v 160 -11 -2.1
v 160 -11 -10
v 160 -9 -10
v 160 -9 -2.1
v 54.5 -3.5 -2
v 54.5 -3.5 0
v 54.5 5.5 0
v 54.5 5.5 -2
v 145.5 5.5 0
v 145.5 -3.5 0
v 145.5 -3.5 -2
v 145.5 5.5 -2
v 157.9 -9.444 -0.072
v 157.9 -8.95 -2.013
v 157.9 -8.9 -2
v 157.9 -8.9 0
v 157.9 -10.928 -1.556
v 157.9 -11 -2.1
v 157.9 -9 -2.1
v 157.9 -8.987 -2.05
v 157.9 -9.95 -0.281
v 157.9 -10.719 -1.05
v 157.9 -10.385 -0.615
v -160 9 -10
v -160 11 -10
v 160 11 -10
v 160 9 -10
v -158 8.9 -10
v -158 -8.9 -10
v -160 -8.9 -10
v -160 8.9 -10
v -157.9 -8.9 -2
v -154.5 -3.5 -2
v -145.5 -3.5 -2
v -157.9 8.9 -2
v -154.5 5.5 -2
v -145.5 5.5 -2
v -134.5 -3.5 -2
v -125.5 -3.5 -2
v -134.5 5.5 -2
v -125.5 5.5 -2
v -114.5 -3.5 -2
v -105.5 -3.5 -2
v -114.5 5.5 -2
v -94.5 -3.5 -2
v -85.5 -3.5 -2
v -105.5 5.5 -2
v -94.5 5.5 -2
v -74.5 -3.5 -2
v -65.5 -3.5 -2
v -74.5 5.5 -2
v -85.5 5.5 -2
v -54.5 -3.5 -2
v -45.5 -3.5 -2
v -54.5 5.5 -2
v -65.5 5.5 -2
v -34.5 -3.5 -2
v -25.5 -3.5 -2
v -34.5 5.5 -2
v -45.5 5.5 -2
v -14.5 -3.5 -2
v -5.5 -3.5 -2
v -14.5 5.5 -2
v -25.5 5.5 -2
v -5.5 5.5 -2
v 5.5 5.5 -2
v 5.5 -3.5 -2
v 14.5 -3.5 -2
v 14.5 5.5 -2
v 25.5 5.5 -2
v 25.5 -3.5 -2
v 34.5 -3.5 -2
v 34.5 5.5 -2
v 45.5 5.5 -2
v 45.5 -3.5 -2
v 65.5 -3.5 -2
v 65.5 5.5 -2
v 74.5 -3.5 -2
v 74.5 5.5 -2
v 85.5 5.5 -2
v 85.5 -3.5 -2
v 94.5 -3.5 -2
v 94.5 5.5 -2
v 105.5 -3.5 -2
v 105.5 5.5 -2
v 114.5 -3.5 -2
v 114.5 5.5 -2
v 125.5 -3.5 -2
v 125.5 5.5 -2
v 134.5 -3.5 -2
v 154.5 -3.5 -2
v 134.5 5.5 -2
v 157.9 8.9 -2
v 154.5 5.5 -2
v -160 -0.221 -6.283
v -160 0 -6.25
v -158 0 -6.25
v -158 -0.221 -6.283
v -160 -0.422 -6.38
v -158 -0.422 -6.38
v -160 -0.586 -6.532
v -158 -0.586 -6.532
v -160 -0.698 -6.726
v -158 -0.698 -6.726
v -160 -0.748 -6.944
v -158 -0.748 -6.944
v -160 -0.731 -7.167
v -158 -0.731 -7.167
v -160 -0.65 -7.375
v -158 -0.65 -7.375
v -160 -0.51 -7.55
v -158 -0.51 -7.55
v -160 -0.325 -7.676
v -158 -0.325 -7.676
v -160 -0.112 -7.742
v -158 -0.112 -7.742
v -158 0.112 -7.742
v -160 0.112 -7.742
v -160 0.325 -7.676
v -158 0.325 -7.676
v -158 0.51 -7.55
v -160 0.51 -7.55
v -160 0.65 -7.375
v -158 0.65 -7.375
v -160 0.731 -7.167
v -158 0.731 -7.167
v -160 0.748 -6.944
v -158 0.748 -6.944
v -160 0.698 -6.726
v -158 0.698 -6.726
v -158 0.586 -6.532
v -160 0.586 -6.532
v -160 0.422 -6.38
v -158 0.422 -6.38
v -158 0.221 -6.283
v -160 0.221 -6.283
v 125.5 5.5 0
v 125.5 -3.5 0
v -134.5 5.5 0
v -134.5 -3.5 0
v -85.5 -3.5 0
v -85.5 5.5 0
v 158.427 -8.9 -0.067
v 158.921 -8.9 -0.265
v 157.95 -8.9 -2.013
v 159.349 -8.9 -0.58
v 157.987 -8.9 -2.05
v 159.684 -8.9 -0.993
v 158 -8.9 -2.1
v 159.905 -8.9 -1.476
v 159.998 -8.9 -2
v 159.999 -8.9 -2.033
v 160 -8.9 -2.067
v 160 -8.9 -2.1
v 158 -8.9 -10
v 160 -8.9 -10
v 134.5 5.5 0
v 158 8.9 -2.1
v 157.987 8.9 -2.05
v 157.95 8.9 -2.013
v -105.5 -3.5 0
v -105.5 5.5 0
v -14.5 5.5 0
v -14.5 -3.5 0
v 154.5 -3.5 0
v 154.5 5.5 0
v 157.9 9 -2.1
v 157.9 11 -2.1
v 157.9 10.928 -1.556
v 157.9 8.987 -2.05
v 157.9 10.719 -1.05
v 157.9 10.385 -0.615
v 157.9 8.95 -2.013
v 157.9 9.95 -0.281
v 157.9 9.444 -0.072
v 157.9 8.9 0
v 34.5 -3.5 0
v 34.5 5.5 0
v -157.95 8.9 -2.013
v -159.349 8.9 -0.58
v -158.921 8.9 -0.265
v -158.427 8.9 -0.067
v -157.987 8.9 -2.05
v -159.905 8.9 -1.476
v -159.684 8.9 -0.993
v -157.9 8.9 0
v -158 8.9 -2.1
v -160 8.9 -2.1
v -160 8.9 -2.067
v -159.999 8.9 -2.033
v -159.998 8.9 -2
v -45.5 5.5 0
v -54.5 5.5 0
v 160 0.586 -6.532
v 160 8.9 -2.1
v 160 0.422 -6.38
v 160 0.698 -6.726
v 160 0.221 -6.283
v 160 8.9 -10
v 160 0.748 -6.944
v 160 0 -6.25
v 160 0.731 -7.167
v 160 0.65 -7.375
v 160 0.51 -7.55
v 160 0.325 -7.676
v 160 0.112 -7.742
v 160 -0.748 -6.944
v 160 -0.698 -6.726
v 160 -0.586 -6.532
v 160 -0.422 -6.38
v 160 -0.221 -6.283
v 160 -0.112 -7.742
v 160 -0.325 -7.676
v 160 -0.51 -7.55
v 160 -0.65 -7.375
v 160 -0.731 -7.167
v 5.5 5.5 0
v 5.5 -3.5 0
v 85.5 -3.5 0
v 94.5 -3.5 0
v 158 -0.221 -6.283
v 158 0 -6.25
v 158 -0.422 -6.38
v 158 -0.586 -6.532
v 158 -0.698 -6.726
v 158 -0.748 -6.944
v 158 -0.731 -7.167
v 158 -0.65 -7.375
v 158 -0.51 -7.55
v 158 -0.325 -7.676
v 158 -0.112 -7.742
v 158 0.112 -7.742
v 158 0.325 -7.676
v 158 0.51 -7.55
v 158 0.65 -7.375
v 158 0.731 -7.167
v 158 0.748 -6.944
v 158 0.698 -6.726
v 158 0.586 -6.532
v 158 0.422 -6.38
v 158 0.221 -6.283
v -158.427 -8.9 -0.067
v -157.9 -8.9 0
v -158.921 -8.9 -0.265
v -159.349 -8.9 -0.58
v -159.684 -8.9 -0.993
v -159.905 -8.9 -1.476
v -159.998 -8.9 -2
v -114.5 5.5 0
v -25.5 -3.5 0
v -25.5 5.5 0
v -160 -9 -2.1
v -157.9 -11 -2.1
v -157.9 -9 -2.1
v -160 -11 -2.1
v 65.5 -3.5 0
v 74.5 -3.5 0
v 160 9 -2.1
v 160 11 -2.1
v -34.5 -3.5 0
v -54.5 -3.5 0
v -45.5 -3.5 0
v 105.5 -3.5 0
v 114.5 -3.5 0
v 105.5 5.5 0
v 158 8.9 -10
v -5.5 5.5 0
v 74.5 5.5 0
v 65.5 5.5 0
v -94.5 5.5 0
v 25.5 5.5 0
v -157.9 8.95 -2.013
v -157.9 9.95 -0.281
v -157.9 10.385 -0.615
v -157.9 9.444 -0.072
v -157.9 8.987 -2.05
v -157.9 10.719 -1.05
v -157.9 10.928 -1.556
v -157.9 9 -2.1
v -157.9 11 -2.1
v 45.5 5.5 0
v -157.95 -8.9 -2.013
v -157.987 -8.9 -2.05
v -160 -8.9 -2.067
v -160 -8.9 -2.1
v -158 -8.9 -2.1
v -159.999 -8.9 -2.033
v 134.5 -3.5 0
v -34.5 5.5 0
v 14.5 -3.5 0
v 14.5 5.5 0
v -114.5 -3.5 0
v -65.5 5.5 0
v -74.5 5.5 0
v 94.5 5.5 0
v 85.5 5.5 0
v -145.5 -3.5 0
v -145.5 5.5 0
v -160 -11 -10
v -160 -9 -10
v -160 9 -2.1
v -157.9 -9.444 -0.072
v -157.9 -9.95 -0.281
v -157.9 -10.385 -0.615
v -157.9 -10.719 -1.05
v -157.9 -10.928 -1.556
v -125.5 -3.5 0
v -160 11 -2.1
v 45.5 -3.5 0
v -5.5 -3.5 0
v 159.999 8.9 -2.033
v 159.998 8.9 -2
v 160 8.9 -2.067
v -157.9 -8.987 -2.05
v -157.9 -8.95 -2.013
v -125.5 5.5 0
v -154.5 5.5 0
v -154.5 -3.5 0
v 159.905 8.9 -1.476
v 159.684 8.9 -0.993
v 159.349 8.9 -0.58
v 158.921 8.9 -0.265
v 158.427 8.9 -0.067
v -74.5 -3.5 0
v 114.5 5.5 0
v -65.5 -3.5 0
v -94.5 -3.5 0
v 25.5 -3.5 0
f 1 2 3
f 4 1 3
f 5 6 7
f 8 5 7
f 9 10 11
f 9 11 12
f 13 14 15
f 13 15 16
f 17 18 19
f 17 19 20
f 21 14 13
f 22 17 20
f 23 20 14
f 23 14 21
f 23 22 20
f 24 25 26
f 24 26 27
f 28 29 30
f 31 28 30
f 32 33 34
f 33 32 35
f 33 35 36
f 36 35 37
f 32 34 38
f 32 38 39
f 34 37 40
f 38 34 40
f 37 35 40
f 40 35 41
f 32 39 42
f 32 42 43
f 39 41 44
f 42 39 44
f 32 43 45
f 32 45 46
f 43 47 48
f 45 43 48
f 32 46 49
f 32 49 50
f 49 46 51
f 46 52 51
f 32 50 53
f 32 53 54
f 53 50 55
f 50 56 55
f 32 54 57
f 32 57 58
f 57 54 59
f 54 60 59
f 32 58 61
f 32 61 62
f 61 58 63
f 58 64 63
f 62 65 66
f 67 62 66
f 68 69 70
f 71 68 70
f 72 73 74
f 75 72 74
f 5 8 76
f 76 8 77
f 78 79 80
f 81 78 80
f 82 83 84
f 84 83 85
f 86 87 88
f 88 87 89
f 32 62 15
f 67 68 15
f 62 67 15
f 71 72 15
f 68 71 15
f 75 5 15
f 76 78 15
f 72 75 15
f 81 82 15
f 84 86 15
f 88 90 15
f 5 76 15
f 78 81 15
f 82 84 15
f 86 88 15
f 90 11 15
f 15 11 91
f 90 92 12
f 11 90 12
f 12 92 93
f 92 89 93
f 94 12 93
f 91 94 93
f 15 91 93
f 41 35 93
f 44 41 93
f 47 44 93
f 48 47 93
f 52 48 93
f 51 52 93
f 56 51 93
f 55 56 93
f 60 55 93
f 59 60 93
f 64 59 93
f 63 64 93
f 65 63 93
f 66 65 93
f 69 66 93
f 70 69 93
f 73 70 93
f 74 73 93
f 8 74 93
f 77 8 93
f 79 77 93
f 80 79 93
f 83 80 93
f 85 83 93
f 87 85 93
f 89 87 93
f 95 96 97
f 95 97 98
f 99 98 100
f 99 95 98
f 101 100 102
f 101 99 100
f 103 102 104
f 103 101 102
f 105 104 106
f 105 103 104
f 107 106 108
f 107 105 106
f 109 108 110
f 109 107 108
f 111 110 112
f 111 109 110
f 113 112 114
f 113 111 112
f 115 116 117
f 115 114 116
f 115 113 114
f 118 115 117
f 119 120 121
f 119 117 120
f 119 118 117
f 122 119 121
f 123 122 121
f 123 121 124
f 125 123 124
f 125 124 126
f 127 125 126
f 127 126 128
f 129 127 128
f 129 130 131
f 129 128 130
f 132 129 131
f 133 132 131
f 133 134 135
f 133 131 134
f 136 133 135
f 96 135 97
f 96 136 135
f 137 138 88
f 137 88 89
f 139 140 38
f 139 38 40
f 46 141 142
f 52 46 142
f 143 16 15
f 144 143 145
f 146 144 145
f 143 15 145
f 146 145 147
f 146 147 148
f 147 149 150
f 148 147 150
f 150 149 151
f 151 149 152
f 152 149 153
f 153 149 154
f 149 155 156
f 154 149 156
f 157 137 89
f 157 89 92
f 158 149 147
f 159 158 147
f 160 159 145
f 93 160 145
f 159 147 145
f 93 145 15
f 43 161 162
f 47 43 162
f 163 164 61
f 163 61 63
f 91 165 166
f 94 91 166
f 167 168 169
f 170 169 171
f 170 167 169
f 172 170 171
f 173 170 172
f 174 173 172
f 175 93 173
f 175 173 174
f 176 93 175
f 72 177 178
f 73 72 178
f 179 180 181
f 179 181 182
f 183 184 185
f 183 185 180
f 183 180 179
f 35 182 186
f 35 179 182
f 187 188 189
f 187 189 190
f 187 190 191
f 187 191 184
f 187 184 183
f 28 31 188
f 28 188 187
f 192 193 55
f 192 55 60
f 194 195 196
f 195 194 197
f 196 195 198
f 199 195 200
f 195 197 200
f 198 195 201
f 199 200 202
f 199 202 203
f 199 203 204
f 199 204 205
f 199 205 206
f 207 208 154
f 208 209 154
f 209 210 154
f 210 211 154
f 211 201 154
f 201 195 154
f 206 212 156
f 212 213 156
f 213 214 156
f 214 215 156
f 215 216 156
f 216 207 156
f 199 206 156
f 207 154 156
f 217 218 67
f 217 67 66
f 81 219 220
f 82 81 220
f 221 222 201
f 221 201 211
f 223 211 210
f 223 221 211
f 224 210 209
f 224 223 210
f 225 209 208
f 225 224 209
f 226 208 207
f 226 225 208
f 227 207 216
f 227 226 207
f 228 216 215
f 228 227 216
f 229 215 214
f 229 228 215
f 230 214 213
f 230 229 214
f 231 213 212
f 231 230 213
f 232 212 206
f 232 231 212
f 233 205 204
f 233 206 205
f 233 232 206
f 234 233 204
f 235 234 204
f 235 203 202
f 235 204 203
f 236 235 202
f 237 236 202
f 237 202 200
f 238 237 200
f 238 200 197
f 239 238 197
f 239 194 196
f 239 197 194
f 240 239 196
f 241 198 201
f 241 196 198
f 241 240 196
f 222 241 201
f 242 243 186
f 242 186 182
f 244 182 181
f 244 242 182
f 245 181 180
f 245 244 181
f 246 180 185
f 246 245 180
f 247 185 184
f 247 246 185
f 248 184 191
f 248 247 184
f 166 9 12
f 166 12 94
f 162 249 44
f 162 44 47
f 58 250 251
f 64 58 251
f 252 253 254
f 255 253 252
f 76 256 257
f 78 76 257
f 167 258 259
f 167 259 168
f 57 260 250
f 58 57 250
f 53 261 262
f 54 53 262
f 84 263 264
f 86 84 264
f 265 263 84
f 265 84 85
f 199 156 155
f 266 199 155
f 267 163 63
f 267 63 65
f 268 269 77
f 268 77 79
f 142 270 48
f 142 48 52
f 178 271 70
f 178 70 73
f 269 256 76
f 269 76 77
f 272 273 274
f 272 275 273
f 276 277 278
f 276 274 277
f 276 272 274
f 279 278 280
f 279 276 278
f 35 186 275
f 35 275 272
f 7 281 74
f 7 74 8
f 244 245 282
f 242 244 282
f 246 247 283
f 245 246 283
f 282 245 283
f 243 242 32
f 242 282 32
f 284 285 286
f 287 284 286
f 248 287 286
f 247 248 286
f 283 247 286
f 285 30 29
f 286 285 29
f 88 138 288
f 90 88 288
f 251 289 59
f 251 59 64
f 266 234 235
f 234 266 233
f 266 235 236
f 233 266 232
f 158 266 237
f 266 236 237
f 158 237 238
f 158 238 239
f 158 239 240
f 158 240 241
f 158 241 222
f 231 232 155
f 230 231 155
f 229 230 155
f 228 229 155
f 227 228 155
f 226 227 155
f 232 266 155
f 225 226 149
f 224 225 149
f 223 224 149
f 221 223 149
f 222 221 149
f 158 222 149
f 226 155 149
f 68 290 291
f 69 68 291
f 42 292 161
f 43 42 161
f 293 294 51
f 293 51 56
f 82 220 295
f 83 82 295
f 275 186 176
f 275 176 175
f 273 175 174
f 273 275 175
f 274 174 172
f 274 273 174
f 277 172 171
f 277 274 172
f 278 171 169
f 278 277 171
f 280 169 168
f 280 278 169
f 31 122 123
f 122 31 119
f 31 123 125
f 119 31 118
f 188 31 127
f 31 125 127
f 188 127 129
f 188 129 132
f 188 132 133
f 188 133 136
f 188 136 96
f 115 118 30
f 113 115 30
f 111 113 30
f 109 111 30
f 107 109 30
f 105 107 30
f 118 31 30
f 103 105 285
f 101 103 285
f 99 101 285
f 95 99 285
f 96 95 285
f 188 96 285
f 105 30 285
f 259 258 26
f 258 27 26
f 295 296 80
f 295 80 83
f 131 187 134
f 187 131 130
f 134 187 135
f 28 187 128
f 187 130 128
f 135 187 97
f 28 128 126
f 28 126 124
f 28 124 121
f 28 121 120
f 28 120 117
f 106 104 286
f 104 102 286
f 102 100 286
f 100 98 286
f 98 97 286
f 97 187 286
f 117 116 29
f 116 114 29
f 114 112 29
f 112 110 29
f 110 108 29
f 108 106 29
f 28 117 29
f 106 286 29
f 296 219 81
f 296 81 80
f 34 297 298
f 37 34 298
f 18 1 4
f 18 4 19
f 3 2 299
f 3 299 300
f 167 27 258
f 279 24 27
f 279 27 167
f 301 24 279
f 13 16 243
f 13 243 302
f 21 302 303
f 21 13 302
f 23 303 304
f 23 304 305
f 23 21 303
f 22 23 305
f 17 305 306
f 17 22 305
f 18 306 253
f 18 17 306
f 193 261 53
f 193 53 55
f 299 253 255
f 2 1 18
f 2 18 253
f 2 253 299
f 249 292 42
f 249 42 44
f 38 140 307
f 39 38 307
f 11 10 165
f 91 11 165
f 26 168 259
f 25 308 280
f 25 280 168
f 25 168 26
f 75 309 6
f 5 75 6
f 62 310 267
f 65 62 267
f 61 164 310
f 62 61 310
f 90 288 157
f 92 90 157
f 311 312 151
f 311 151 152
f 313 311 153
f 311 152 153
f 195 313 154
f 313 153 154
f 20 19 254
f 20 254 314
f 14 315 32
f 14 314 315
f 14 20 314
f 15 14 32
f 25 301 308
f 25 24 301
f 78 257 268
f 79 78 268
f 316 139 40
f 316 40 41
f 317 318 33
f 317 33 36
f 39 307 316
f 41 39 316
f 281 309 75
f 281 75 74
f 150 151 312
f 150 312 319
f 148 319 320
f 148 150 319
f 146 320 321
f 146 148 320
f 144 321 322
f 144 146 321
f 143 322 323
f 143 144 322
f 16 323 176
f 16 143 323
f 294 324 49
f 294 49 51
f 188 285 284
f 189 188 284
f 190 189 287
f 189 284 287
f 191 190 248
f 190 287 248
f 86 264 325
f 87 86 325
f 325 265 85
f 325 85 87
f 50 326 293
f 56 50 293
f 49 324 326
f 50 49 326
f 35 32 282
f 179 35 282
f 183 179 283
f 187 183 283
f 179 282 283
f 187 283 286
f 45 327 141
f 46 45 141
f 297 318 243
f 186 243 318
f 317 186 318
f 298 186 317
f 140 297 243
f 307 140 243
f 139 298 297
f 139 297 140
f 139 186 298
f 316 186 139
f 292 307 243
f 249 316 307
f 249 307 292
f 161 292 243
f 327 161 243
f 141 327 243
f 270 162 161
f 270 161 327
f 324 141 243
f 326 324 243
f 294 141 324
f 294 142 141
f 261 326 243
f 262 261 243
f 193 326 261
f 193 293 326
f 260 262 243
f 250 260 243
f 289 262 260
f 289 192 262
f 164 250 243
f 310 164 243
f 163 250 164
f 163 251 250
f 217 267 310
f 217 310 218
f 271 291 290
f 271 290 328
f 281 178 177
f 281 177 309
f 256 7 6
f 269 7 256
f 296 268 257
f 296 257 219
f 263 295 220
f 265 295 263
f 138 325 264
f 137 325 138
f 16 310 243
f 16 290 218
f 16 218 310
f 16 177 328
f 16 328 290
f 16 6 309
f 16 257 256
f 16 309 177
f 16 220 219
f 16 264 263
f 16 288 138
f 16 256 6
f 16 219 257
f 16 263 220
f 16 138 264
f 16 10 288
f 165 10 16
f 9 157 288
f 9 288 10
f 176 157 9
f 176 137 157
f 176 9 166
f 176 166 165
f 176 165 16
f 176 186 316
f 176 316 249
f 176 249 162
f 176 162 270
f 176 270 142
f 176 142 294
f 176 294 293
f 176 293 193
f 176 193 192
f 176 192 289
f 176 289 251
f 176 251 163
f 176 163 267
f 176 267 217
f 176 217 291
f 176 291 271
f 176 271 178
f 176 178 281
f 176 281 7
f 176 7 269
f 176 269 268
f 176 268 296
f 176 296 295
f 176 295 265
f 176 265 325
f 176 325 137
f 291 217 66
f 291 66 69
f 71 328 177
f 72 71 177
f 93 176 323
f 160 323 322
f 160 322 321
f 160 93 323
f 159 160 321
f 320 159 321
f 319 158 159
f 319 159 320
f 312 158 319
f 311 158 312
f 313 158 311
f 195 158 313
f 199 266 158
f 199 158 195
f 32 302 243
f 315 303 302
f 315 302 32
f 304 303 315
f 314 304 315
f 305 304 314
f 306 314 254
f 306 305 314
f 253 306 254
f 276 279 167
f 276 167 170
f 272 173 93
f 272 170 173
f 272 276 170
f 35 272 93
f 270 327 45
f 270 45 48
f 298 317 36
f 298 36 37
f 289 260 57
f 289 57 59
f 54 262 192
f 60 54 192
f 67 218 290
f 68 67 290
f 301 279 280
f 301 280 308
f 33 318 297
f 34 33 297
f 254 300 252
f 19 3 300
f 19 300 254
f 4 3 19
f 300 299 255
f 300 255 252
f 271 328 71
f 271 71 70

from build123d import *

# Parameters (mm, degrees)
SKETCH_1_W                         = 320
SKETCH_1_H                         = 22
SM_BASE_FLANGE_1_DEPTH             = 2
SM_EDGE_FLANGE_1_STRIP_W           = 8.2
SM_EDGE_FLANGE_1_STRIP_H           = 2
SM_EDGE_FLANGE_1_STRIP_CUT_DEPTH   = 320
SM_EDGE_FLANGE_1_STRIP_2_W         = 8.2
SM_EDGE_FLANGE_1_STRIP_2_H         = 2
SM_EDGE_FLANGE_1_STRIP_CUT_2_DEPTH = 320
SM_EDGE_FLANGE_1_DEPTH             = 320
SM_EDGE_FLANGE_1_BEND_DEPTH        = 320
SM_START                           = -11
SM_EDGE_FLANGE_2_DEPTH             = 22
SM_EDGE_FLANGE_2_2_DEPTH           = 2.1
SM_START_2                         = 8.9
SM_EDGE_FLANGE_2_3_DEPTH           = 2.1
SM_START_3                         = -8.9
SM_EDGE_FLANGE_2_4_DEPTH           = 17.8
SKETCH_18_W                        = 9
SKETCH_18_H                        = 9
CUT_EXTRUDE_1_DEPTH                = 10
PATTERN_LINEAR_1_COUNT             = 20
PATTERN_LINEAR_1_PITCH             = 20
CUT_EXTRUDE_2_DEPTH                = 321.345126387
CUT_EXTRUDE_2_DEPTH_BACK           = 321.345126387
SKETCH_19_R                        = 0.75


# Read off the part's stored shape, not the designer's step: 边线-法兰2
# Sheet-metal steps are written as plain solids
with BuildPart() as part:
    # Sketch 1 → 基体-法兰1 (new body)
    with BuildSketch(Plane.XY):
        Rectangle(SKETCH_1_W, SKETCH_1_H)
    extrude(amount=-SM_BASE_FLANGE_1_DEPTH)

    # 边线-法兰1 strip (across the edge) → 边线-法兰1 strip cut (cut)
    with BuildSketch(Plane(origin=(160, -11, -2), x_dir=(0, 1, 0), z_dir=(-1, 0, 0))):
        with Locations((-2, -1)):
            Rectangle(SM_EDGE_FLANGE_1_STRIP_W, SM_EDGE_FLANGE_1_STRIP_H)
    extrude(amount=SM_EDGE_FLANGE_1_STRIP_CUT_DEPTH, mode=Mode.SUBTRACT)

    # 边线-法兰1 strip 2 (across the edge) → 边线-法兰1 strip cut 2 (cut)
    with BuildSketch(Plane(origin=(-160, 11, -2), x_dir=(0, -1, 0), z_dir=(1, 0, 0))):
        with Locations((-2, -1)):
            Rectangle(SM_EDGE_FLANGE_1_STRIP_2_W, SM_EDGE_FLANGE_1_STRIP_2_H)
    extrude(amount=SM_EDGE_FLANGE_1_STRIP_CUT_2_DEPTH, mode=Mode.SUBTRACT)

    # 边线-法兰1 section (across the edge) → 边线-法兰1 (add)
    with BuildSketch(Plane(origin=(160, -11, -2), x_dir=(0, 1, 0), z_dir=(-1, 0, 0))):
        with BuildLine():
            Line((0, 0.1), (0, 8))
            Line((0, 8), (2, 8))
            Line((2, 8), (2, 0.1))
            ThreePointArc((2, 0.1), (2.029289322, 0.029289322), (2.1, 0))
            Line((2.1, 0), (2.1, -2))
            ThreePointArc((2.1, -2), (0.61507576, -1.38492424), (0, 0.1))
        make_face()
    extrude(amount=SM_EDGE_FLANGE_1_DEPTH)

    # 边线-法兰1 section 2 (across the edge) → 边线-法兰1 bend (add)
    with BuildSketch(Plane(origin=(-160, 11, -2), x_dir=(0, -1, 0), z_dir=(1, 0, 0))):
        with BuildLine():
            Line((0, 0.1), (0, 8))
            Line((0, 8), (2, 8))
            Line((2, 8), (2, 0.1))
            ThreePointArc((2, 0.1), (2.029289322, 0.029289322), (2.1, 0))
            Line((2.1, 0), (2.1, -2))
            ThreePointArc((2.1, -2), (0.61507576, -1.38492424), (0, 0.1))
        make_face()
    extrude(amount=SM_EDGE_FLANGE_1_BEND_DEPTH)

    # 边线-法兰2 outline → 边线-法兰2 (cut)
    with BuildSketch(Plane(origin=(0, 0, 0), x_dir=(1, 0, 0), z_dir=(0, 1, 0)).offset(SM_START)):
        with BuildLine():
            Line((158, 2.1), (157.9, 2.1))
            Line((157.9, 2.1), (157.9, 2))
            ThreePointArc((157.9, 2), (157.970710678, 2.029289322), (158, 2.1))
        make_face()
        with BuildLine():
            ThreePointArc((160, 2.1), (159.38492424, 0.61507576), (157.9, 0))
            Line((157.9, 0), (160, 0))
            Line((160, 0), (160, 2.1))
        make_face()
        with BuildLine():
            ThreePointArc((-158, 2.1), (-157.970710678, 2.029289322), (-157.9, 2))
            Line((-157.9, 2), (-157.9, 2.1))
            Line((-157.9, 2.1), (-158, 2.1))
        make_face()
        with BuildLine():
            Line((-160, 0), (-157.9, 0))
            ThreePointArc((-157.9, 0), (-159.38492424, 0.61507576), (-160, 2.1))
            Line((-160, 2.1), (-160, 0))
        make_face()
    extrude(amount=SM_EDGE_FLANGE_2_DEPTH, mode=Mode.SUBTRACT)

    # Sm Edge Flange 2 2 outline → Sm Edge Flange 2 2 (cut)
    with BuildSketch(Plane(origin=(0, 0, 0), x_dir=(1, 0, 0), z_dir=(0, 1, 0)).offset(SM_START)):
        with BuildLine():
            Line((160, 2.1), (158, 2.1))
            ThreePointArc((158, 2.1), (157.970710678, 2.029289322), (157.9, 2))
            Line((157.9, 2), (157.9, 0))
            ThreePointArc((157.9, 0), (159.38492424, 0.61507576), (160, 2.1))
        make_face()
        with BuildLine():
            ThreePointArc((-160, 2.1), (-159.38492424, 0.61507576), (-157.9, 0))
            Line((-157.9, 0), (-157.9, 2))
            ThreePointArc((-157.9, 2), (-157.970710678, 2.029289322), (-158, 2.1))
            Line((-158, 2.1), (-160, 2.1))
        make_face()
    extrude(amount=SM_EDGE_FLANGE_2_2_DEPTH, mode=Mode.SUBTRACT)

    # Sm Edge Flange 2 3 outline → Sm Edge Flange 2 3 (cut)
    with BuildSketch(Plane(origin=(0, 0, 0), x_dir=(1, 0, 0), z_dir=(0, 1, 0)).offset(SM_START_2)):
        with BuildLine():
            Line((160, 2.1), (158, 2.1))
            ThreePointArc((158, 2.1), (157.970710678, 2.029289322), (157.9, 2))
            Line((157.9, 2), (157.9, 0))
            ThreePointArc((157.9, 0), (159.38492424, 0.61507576), (160, 2.1))
        make_face()
        with BuildLine():
            ThreePointArc((-160, 2.1), (-159.38492424, 0.61507576), (-157.9, 0))
            Line((-157.9, 0), (-157.9, 2))
            ThreePointArc((-157.9, 2), (-157.970710678, 2.029289322), (-158, 2.1))
            Line((-158, 2.1), (-160, 2.1))
        make_face()
    extrude(amount=SM_EDGE_FLANGE_2_3_DEPTH, mode=Mode.SUBTRACT)

    # Sm Edge Flange 2 4 outline → Sm Edge Flange 2 4 (add)
    with BuildSketch(Plane(origin=(0, 0, 0), x_dir=(1, 0, 0), z_dir=(0, 1, 0)).offset(SM_START_3)):
        with BuildLine():
            Line((158, 10), (158, 2.1))
            ThreePointArc((158, 2.1), (157.970710678, 2.029289322), (157.9, 2))
            Line((157.9, 2), (159.997617696, 2))
            ThreePointArc((159.997617696, 2), (159.99940434, 2.049985814), (160, 2.1))
            Line((160, 2.1), (160, 10))
            Line((160, 10), (158, 10))
        make_face()
        with BuildLine():
            Line((-159.997617696, 2), (-157.9, 2))
            ThreePointArc((-157.9, 2), (-157.970710678, 2.029289322), (-158, 2.1))
            Line((-158, 2.1), (-158, 10))
            Line((-158, 10), (-160, 10))
            Line((-160, 10), (-160, 2.1))
            ThreePointArc((-160, 2.1), (-159.99940434, 2.049985814), (-159.997617696, 2))
        make_face()
    extrude(amount=SM_EDGE_FLANGE_2_4_DEPTH)

    # 草图18 → 切除-拉伸1 (cut)
    with BuildSketch(Plane.XY):
        with Locations((-150, 1)):
            Rectangle(SKETCH_18_W, SKETCH_18_H)
    cut_extrude_1 = extrude(amount=-CUT_EXTRUDE_1_DEPTH, mode=Mode.SUBTRACT)

    # 阵列(线性)1: 切除-拉伸1 ×20
    with Locations(*[(i * PATTERN_LINEAR_1_PITCH, 0, 0) for i in range(1, PATTERN_LINEAR_1_COUNT)]):
        add(cut_extrude_1, mode=Mode.SUBTRACT)

    # 草图19 → 切除-拉伸2 (cut, two sides: drawn at the far end of the back side and taken through both)
    with BuildSketch(Plane(origin=(160, 0, 0), x_dir=(0, 0, -1), z_dir=(1, 0, 0)).offset(-CUT_EXTRUDE_2_DEPTH_BACK)):
        with Locations(Location((7, 0, 0), (0, 0, 180))):
            Circle(SKETCH_19_R)
    extrude(amount=CUT_EXTRUDE_2_DEPTH + CUT_EXTRUDE_2_DEPTH_BACK, mode=Mode.SUBTRACT)


solid = part.part
